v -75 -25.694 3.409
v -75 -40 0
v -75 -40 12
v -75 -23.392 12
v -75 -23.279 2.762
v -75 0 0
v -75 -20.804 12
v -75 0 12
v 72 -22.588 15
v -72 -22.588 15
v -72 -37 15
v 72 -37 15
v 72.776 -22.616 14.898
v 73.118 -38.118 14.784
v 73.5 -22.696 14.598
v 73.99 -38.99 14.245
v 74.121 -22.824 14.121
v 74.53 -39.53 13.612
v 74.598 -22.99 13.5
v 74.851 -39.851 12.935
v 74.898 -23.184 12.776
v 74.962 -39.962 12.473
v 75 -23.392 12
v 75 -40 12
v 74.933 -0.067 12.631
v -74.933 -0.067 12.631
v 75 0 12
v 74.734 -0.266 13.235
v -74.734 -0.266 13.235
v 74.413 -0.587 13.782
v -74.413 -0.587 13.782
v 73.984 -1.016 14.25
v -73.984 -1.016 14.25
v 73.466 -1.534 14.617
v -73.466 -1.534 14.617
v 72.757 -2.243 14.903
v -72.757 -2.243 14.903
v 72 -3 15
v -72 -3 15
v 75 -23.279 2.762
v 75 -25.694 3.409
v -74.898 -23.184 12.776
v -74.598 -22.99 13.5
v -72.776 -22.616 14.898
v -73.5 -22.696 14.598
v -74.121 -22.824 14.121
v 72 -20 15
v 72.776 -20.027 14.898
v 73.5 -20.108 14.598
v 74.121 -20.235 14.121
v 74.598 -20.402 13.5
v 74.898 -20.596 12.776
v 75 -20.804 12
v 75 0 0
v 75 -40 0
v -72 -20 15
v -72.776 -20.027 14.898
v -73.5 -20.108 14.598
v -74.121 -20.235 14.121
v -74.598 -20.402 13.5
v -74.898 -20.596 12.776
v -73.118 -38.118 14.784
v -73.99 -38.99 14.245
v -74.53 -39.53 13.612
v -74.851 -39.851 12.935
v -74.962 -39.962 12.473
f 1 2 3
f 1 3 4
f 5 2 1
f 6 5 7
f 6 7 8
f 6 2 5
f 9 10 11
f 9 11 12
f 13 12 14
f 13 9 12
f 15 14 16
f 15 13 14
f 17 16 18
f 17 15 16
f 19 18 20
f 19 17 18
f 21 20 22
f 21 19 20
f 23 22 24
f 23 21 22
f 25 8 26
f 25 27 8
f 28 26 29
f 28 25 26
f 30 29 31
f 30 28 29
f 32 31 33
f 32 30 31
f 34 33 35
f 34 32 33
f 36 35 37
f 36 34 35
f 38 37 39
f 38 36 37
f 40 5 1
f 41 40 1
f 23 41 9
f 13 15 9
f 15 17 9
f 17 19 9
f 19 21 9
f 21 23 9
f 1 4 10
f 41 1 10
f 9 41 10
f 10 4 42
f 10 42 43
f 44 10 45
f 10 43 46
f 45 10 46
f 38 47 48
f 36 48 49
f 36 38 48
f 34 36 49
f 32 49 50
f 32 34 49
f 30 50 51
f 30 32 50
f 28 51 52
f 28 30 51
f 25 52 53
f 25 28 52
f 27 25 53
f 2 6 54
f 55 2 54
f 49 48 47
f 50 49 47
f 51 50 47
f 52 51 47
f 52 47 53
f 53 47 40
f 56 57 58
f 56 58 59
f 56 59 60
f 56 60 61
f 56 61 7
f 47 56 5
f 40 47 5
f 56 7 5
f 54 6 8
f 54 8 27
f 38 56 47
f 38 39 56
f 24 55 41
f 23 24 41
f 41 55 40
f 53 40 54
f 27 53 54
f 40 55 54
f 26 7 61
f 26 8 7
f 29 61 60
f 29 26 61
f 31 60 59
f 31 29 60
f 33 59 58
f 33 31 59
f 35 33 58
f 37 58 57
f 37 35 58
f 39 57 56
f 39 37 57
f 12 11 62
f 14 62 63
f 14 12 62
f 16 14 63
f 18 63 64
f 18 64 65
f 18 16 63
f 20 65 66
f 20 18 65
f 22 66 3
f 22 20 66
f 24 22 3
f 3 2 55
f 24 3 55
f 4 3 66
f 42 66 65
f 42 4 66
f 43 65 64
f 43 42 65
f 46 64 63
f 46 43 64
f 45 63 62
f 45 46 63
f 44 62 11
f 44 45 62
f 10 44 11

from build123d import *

# Parameters (mm, degrees)
F0_W     = 150
F0_H     = 40
F1_DEPTH = 15
F3_DEPTH = 150
F4_R     = 3


with BuildPart() as f1:
    # F0 (on Top) → F1 (new body)
    with BuildSketch(Plane.XY):
        with Locations((0, -20)):
            Rectangle(F0_W, F0_H)
    extrude(amount=F1_DEPTH)

    # F2 (on face) → F3 (cut)
    with BuildSketch(Plane(origin=(-75, 0, 0), x_dir=(0, -1, 0), z_dir=(-1, 0, 0))):
        Polygon((22.588190451, 15), (20, 15), (23.2792044265, 2.7618424718), (25.6940189923, 3.4088900845), align=None)
    extrude(amount=-F3_DEPTH, mode=Mode.SUBTRACT)

    # F4
    f4_edges = [f1.edges().sort_by_distance(p)[0] for p in [
        (0, 0, 15),
        (-75, -10, 15),
        (75, -10, 15),
        (75, -31.294095, 15),
        (0, -40, 15),
        (-75, -31.294095, 15),
    ]]
    fillet(f4_edges, radius=F4_R)


solid = f1.part
